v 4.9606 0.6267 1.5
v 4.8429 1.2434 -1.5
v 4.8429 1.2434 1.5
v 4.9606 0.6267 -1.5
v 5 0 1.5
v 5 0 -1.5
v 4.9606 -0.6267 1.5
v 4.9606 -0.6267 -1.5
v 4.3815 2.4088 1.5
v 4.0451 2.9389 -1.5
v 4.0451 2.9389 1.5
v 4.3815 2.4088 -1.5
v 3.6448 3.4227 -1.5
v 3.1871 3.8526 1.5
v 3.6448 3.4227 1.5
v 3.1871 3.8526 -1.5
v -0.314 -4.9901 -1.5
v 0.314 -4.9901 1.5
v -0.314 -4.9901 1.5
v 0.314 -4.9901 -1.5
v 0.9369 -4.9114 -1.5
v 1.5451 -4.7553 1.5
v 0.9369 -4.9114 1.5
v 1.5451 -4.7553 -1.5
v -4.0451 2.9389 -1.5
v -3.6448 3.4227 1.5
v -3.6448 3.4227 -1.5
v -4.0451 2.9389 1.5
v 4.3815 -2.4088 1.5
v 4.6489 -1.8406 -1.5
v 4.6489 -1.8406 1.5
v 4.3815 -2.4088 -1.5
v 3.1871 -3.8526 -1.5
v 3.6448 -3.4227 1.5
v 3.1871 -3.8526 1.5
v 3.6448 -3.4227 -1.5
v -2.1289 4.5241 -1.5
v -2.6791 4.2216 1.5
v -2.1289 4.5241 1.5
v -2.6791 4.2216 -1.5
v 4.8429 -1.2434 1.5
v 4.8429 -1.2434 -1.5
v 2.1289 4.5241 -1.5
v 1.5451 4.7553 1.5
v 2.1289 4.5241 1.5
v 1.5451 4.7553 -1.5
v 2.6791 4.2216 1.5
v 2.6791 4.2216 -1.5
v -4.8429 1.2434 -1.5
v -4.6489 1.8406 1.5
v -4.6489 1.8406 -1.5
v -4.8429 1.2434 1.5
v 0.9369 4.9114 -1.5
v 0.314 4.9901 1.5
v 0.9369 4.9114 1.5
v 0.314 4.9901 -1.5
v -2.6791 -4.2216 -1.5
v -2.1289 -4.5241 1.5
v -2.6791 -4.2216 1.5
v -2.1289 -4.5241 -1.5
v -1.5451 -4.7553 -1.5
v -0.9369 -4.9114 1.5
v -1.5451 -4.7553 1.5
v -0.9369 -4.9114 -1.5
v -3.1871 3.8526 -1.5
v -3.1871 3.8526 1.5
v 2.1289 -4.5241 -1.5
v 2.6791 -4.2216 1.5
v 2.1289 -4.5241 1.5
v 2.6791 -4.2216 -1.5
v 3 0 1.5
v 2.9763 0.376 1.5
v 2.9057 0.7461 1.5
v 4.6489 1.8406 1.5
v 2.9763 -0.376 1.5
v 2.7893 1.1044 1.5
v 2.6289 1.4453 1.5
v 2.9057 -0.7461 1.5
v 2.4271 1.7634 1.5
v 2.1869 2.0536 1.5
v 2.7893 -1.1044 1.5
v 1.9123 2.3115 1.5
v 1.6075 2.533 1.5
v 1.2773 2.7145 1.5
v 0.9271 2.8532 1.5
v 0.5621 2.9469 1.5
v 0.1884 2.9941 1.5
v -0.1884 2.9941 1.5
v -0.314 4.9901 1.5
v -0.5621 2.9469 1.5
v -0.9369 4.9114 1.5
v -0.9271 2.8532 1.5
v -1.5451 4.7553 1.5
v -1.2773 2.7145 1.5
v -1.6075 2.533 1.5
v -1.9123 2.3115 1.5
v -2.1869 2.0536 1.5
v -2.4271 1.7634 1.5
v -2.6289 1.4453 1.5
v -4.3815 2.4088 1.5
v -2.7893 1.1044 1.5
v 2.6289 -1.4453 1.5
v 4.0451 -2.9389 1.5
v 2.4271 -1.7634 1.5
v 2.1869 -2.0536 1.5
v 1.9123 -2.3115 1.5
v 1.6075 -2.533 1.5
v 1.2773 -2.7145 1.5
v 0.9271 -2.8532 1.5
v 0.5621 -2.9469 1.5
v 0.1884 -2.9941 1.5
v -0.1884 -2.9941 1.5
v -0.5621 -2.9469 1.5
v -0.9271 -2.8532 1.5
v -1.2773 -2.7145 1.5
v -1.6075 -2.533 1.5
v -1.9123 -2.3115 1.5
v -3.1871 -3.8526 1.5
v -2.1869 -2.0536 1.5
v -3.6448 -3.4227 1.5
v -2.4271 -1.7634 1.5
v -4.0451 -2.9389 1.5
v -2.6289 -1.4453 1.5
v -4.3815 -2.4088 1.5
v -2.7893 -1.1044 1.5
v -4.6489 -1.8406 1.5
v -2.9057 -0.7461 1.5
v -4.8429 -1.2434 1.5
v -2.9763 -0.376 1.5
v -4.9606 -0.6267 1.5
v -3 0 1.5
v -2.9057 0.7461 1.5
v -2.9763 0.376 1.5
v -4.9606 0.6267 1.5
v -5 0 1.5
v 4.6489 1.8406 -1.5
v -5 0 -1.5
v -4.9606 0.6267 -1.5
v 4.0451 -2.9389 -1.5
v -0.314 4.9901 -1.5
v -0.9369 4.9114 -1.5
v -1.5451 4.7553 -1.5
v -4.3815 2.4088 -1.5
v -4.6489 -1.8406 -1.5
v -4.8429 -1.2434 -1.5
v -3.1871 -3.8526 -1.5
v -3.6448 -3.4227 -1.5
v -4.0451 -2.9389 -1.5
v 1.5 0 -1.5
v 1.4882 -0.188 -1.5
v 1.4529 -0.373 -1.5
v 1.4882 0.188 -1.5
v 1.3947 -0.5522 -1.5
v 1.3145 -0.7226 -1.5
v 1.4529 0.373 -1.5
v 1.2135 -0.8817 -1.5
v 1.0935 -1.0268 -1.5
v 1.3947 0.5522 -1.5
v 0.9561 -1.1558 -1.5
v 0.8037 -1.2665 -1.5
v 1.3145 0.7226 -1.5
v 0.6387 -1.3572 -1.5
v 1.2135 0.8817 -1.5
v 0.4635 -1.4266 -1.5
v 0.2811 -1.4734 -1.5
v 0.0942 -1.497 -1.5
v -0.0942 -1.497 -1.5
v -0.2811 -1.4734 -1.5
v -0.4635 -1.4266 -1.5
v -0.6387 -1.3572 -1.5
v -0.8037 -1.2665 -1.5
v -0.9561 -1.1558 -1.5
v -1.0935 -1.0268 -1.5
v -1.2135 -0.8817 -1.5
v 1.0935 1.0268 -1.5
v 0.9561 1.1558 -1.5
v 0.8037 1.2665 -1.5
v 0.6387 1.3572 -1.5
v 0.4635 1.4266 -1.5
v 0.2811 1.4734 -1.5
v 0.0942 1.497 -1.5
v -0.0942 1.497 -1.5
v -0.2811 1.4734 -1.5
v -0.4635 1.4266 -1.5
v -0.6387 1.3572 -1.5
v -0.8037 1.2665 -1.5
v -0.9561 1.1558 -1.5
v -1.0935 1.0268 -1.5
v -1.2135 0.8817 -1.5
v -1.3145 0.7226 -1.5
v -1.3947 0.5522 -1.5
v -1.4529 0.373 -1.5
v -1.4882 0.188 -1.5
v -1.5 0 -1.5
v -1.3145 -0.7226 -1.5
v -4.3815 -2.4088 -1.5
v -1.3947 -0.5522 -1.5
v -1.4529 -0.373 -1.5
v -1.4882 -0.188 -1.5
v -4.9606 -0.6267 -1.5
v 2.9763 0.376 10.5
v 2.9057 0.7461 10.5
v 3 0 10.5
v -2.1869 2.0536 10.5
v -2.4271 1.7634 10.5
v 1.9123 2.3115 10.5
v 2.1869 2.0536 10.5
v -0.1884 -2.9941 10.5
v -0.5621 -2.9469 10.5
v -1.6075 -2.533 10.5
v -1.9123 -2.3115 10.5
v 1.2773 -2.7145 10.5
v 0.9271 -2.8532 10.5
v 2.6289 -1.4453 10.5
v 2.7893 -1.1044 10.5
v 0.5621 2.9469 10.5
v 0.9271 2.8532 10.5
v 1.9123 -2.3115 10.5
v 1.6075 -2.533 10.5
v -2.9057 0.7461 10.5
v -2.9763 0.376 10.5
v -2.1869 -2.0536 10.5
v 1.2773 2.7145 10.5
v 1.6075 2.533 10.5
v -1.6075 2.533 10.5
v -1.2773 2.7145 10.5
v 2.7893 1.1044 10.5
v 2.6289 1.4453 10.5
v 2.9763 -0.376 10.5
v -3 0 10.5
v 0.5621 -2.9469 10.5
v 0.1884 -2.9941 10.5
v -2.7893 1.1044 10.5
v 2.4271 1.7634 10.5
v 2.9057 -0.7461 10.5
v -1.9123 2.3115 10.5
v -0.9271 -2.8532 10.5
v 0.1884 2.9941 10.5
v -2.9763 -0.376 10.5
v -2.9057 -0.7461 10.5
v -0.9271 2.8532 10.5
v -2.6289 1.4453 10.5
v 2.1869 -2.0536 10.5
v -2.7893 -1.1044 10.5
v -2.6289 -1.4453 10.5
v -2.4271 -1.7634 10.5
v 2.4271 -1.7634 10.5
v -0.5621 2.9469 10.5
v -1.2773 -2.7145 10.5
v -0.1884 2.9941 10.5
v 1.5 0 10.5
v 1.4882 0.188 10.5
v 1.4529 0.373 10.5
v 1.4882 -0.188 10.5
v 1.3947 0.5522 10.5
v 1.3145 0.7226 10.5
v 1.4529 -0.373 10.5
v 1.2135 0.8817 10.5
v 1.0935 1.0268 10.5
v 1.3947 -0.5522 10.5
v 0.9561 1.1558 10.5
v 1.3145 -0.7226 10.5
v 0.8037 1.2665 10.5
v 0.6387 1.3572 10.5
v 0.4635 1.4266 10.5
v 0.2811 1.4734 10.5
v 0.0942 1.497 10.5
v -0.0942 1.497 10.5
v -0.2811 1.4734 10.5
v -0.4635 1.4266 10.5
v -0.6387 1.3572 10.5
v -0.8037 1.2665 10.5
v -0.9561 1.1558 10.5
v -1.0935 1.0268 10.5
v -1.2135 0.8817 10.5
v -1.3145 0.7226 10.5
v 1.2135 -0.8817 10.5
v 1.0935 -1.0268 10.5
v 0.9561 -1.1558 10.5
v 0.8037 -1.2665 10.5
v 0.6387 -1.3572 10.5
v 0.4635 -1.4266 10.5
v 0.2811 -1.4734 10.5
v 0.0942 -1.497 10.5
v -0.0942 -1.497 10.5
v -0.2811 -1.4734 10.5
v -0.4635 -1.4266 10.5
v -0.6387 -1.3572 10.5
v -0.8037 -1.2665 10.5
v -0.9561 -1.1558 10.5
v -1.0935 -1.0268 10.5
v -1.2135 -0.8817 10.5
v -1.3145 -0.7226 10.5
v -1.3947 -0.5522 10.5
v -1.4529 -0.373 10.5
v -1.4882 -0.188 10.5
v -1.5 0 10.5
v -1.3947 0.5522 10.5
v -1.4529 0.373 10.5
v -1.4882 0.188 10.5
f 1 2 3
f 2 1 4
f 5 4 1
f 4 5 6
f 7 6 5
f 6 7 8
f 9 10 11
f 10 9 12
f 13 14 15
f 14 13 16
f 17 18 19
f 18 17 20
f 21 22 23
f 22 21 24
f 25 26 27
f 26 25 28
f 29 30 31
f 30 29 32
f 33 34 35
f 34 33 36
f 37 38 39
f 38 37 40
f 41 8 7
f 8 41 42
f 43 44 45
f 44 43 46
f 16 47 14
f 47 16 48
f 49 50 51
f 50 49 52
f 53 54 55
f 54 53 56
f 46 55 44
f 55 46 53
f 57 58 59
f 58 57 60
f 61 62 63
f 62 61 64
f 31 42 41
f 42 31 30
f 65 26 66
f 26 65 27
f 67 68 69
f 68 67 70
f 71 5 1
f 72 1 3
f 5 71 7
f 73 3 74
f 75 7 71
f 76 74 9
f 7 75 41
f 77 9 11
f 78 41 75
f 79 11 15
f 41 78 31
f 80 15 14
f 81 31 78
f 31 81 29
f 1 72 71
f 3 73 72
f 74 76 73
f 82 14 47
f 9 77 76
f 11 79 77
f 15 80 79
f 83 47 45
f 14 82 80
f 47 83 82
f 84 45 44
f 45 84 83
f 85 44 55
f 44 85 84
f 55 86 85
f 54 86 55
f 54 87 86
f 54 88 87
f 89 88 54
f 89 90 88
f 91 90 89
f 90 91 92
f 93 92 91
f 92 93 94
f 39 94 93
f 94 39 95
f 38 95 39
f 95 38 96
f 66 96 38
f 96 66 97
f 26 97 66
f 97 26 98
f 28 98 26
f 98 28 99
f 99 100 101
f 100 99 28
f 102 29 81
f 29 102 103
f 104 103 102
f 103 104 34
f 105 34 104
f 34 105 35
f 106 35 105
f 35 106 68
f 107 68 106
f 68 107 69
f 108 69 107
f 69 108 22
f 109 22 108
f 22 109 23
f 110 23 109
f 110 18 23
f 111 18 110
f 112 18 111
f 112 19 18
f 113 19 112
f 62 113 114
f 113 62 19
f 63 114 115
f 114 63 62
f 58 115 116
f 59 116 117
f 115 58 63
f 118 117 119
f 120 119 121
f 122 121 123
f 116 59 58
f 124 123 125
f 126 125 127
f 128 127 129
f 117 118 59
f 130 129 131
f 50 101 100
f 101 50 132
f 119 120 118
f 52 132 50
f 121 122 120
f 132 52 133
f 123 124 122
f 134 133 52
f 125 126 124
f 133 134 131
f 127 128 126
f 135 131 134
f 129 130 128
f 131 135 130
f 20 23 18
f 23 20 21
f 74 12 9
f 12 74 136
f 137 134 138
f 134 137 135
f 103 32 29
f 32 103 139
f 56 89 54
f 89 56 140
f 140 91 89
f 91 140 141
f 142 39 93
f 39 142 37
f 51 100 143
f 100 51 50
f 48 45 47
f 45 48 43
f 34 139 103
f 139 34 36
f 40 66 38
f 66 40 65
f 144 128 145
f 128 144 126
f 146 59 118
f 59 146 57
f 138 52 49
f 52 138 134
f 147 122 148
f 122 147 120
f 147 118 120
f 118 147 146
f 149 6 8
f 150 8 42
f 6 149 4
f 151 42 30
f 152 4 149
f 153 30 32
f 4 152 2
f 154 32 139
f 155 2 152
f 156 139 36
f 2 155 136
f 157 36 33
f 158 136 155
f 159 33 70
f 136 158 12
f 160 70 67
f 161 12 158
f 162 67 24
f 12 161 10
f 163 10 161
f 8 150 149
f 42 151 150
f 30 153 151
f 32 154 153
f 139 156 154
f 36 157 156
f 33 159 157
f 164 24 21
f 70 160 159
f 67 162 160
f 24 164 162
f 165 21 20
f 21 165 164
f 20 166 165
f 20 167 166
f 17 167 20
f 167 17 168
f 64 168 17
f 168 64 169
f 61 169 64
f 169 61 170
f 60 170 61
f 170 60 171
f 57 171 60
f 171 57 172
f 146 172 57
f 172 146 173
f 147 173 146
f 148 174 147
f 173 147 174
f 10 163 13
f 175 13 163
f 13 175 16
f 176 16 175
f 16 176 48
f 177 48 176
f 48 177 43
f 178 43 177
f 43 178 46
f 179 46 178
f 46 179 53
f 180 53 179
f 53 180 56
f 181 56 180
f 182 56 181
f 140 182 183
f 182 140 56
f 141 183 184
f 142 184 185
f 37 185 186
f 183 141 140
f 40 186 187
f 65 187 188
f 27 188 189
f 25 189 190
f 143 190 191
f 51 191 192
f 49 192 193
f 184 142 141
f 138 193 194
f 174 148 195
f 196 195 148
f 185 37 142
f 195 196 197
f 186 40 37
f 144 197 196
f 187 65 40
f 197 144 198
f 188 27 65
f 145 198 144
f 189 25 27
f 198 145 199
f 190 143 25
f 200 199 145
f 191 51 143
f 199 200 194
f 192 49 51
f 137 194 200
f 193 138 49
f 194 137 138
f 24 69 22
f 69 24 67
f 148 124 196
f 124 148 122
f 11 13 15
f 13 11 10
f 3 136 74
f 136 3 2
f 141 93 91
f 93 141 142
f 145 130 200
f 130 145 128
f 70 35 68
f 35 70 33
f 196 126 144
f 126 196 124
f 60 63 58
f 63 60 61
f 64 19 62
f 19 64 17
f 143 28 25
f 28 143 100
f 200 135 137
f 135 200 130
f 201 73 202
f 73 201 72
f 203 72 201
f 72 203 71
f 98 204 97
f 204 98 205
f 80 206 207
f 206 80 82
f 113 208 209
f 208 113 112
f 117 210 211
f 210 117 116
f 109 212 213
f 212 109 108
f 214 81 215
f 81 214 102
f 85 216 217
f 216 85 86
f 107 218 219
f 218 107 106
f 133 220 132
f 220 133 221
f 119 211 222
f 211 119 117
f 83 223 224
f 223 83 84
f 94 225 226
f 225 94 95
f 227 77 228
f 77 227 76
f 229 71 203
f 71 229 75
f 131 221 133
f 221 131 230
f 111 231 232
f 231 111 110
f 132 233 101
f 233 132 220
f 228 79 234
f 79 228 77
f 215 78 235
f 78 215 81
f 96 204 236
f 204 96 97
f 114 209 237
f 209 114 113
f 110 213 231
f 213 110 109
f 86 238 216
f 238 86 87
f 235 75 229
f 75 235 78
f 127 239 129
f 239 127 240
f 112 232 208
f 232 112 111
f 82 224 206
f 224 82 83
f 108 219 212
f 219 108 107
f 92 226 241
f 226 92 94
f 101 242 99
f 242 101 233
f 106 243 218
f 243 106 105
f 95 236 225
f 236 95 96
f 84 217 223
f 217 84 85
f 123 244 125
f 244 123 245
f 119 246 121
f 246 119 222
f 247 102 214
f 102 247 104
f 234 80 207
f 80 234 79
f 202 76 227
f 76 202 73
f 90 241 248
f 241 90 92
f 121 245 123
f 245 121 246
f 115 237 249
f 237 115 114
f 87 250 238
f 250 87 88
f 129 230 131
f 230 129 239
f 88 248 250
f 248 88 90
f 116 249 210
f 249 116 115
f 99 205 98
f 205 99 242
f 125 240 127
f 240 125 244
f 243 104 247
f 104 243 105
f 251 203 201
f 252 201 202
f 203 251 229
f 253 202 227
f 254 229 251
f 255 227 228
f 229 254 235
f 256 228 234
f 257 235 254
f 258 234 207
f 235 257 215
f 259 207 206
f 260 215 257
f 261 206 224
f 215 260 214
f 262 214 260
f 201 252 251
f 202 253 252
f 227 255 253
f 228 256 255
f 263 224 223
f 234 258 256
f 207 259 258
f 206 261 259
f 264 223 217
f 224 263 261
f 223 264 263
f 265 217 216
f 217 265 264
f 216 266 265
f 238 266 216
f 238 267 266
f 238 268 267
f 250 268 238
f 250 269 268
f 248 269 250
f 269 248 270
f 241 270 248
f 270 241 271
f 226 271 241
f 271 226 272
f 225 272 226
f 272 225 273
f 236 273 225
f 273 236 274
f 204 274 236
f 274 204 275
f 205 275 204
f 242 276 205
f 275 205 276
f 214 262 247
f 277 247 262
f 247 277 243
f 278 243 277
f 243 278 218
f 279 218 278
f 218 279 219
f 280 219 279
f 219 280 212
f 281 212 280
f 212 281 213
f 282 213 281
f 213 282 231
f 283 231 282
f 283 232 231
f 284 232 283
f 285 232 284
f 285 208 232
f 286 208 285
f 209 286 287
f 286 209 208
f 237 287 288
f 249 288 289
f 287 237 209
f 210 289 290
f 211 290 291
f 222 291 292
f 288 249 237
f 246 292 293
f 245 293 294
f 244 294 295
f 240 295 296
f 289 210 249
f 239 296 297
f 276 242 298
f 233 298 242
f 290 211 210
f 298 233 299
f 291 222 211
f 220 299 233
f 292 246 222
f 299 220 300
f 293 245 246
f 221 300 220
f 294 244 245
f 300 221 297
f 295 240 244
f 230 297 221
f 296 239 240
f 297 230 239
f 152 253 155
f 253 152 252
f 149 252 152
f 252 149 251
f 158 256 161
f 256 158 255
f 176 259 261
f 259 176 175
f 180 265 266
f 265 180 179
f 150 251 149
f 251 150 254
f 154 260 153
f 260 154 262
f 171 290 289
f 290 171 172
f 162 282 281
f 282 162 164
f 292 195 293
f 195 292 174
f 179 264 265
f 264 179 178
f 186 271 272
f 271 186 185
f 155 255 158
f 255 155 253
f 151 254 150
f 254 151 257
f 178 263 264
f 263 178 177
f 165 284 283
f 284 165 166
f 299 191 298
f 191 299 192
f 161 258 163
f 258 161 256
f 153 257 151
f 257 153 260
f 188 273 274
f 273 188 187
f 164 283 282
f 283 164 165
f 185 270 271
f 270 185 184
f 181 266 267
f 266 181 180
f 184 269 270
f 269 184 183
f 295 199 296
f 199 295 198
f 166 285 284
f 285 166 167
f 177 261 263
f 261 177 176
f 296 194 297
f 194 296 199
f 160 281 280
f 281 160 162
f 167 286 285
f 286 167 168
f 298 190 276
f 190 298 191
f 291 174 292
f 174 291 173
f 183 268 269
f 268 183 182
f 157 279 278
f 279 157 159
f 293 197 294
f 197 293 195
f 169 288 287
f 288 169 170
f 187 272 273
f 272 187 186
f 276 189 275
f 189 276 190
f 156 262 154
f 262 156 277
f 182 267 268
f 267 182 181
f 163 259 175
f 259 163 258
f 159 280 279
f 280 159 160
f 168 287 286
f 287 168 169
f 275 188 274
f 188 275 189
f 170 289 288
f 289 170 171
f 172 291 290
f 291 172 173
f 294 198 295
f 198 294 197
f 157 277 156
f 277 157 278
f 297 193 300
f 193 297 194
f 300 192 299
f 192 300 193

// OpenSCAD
$fn = 50;


difference() {
	union() {
		translate(v = [0, 0, -1.5000000000]) {
			cylinder(h = 3, r = 5.0000000000);
		}
		translate(v = [0, 0, -1.5000000000]) {
			cylinder(h = 12, r = 3.0000000000);
		}
	}
	union() {
		translate(v = [0, 0, -100.0000000000]) {
			cylinder(h = 200, r = 1.5000000000);
		}
	}
}
